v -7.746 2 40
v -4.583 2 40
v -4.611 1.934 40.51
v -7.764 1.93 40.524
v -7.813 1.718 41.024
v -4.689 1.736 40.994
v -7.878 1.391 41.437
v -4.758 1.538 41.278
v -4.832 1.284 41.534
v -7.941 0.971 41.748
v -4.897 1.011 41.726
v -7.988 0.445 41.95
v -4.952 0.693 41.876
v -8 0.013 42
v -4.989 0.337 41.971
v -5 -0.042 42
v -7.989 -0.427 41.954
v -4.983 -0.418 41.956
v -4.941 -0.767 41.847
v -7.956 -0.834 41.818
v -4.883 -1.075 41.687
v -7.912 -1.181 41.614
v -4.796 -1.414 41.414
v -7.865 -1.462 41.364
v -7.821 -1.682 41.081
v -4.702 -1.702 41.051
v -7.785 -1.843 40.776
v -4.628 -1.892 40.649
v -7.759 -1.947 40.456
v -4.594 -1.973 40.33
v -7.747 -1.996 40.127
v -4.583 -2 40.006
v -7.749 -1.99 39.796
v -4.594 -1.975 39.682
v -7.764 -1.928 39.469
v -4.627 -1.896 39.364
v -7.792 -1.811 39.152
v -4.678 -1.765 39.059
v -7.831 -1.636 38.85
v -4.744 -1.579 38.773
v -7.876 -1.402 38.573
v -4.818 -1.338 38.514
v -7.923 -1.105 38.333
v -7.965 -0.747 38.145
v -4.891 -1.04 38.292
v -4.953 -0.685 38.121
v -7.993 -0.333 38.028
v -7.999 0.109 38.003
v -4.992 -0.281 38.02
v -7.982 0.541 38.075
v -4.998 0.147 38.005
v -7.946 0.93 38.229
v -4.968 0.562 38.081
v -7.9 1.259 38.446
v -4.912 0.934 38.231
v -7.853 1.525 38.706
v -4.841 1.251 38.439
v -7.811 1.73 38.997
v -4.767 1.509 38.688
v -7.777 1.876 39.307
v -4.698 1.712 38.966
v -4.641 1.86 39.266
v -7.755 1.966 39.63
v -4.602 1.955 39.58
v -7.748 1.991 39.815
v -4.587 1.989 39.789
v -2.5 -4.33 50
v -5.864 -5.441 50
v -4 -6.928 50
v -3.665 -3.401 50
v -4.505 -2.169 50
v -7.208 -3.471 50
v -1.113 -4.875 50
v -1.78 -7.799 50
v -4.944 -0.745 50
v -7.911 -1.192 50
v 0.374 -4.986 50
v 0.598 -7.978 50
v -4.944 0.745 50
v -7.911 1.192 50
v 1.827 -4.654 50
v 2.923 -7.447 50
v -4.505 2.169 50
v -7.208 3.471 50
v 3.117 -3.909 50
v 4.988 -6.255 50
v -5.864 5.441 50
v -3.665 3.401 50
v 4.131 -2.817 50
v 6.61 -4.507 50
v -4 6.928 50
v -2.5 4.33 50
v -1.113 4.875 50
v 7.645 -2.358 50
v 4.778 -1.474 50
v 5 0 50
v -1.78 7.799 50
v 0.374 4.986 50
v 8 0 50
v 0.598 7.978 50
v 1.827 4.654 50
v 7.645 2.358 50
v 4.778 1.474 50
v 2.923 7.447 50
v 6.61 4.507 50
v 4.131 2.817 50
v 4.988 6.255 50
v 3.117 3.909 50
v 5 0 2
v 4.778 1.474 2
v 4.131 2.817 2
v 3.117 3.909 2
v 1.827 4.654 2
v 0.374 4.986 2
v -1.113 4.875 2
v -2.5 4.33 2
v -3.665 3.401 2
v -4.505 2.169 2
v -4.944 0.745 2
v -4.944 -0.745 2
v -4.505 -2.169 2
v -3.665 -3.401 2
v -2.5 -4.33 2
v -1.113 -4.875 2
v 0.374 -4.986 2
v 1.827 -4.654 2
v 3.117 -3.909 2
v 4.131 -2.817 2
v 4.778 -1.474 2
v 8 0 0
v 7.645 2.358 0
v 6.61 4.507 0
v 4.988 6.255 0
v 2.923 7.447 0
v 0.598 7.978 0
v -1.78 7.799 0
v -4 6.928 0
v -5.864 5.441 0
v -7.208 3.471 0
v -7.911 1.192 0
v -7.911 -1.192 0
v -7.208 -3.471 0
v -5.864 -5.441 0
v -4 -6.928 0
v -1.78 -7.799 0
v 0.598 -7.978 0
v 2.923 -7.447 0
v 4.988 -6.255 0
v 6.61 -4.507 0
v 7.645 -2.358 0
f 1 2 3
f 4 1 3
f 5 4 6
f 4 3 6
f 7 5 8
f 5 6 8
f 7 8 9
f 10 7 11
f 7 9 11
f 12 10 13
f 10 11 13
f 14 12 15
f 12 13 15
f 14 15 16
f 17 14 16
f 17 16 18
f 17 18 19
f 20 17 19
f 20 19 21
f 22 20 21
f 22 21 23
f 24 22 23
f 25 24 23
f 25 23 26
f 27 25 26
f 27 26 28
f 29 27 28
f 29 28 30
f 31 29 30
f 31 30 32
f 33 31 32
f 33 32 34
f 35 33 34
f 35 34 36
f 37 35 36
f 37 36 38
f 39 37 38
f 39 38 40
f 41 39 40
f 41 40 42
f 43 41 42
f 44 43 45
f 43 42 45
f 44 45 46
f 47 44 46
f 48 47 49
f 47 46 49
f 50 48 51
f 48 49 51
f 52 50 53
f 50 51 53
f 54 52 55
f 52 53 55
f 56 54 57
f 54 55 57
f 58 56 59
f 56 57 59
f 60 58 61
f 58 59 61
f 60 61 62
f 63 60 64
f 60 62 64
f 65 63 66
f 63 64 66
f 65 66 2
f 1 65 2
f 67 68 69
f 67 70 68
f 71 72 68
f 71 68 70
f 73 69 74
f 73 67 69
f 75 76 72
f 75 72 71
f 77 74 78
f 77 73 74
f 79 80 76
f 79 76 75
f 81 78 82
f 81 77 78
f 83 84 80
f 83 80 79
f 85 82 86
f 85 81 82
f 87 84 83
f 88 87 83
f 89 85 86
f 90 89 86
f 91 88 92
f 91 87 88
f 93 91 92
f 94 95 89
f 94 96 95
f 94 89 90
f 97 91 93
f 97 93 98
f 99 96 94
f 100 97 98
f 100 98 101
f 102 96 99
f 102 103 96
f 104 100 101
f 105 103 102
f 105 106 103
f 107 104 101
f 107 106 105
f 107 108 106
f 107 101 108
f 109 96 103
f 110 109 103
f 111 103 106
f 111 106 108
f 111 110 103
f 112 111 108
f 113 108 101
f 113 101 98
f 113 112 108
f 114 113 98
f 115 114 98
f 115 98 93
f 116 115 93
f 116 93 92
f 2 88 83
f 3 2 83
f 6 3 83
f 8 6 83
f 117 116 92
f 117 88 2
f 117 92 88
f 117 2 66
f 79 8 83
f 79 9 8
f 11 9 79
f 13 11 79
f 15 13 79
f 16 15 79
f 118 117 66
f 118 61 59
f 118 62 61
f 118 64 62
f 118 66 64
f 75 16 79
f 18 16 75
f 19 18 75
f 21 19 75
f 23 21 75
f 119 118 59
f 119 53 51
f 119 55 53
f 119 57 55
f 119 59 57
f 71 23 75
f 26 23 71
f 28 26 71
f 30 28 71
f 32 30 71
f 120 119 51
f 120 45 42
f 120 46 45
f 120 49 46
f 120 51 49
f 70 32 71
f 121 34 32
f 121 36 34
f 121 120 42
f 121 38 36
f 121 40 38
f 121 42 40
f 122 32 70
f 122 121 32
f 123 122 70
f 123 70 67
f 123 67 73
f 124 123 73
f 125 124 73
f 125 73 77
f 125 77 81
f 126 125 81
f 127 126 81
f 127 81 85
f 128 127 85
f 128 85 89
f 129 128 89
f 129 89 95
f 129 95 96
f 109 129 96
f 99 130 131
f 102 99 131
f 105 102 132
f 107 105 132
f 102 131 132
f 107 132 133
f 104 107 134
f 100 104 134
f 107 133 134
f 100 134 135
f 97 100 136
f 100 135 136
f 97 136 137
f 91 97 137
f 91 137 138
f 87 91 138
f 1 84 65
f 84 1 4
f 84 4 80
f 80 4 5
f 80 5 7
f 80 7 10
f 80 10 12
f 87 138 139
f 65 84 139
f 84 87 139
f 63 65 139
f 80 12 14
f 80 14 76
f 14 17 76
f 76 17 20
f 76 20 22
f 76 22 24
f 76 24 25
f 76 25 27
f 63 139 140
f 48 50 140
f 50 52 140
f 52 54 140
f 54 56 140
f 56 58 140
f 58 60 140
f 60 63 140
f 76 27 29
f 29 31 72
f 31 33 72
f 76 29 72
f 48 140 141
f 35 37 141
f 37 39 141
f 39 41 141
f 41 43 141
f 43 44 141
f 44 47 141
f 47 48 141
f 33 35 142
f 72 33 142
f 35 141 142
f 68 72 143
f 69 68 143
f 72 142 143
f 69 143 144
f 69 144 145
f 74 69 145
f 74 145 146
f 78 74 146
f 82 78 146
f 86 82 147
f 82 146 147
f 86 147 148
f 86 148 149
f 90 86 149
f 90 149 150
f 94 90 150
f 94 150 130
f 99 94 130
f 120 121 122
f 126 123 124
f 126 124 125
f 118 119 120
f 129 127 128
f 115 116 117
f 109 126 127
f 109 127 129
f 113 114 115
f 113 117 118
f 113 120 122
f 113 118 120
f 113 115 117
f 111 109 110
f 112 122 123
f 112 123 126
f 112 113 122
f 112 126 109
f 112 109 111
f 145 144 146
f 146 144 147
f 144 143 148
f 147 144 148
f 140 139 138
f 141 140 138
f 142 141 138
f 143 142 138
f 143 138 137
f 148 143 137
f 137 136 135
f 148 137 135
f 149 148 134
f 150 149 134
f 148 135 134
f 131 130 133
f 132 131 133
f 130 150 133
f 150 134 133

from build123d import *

# Parameters (mm, degrees)
F0_R     = 8
F0_R_2   = 5
F1_DEPTH = 50
F2_DEPTH = 2
F3_R     = 2
F4_DEPTH = 25


with BuildPart() as f1:
    # F0 (on Top) → F1 (new body)
    with BuildSketch(Plane.XY):
        Circle(F0_R)
        Circle(F0_R_2, mode=Mode.SUBTRACT)
    extrude(amount=F1_DEPTH)

    # F0 (on Top) → F2 (join)
    with BuildSketch(Plane.XY):
        Circle(F0_R_2)
    extrude(amount=F2_DEPTH)

    # F3 (on Right) → F4 (cut)
    with BuildSketch(Plane.YZ):
        with Locations((0, 40)):
            Circle(F3_R)
    extrude(amount=-F4_DEPTH, mode=Mode.SUBTRACT)


solid = f1.part
